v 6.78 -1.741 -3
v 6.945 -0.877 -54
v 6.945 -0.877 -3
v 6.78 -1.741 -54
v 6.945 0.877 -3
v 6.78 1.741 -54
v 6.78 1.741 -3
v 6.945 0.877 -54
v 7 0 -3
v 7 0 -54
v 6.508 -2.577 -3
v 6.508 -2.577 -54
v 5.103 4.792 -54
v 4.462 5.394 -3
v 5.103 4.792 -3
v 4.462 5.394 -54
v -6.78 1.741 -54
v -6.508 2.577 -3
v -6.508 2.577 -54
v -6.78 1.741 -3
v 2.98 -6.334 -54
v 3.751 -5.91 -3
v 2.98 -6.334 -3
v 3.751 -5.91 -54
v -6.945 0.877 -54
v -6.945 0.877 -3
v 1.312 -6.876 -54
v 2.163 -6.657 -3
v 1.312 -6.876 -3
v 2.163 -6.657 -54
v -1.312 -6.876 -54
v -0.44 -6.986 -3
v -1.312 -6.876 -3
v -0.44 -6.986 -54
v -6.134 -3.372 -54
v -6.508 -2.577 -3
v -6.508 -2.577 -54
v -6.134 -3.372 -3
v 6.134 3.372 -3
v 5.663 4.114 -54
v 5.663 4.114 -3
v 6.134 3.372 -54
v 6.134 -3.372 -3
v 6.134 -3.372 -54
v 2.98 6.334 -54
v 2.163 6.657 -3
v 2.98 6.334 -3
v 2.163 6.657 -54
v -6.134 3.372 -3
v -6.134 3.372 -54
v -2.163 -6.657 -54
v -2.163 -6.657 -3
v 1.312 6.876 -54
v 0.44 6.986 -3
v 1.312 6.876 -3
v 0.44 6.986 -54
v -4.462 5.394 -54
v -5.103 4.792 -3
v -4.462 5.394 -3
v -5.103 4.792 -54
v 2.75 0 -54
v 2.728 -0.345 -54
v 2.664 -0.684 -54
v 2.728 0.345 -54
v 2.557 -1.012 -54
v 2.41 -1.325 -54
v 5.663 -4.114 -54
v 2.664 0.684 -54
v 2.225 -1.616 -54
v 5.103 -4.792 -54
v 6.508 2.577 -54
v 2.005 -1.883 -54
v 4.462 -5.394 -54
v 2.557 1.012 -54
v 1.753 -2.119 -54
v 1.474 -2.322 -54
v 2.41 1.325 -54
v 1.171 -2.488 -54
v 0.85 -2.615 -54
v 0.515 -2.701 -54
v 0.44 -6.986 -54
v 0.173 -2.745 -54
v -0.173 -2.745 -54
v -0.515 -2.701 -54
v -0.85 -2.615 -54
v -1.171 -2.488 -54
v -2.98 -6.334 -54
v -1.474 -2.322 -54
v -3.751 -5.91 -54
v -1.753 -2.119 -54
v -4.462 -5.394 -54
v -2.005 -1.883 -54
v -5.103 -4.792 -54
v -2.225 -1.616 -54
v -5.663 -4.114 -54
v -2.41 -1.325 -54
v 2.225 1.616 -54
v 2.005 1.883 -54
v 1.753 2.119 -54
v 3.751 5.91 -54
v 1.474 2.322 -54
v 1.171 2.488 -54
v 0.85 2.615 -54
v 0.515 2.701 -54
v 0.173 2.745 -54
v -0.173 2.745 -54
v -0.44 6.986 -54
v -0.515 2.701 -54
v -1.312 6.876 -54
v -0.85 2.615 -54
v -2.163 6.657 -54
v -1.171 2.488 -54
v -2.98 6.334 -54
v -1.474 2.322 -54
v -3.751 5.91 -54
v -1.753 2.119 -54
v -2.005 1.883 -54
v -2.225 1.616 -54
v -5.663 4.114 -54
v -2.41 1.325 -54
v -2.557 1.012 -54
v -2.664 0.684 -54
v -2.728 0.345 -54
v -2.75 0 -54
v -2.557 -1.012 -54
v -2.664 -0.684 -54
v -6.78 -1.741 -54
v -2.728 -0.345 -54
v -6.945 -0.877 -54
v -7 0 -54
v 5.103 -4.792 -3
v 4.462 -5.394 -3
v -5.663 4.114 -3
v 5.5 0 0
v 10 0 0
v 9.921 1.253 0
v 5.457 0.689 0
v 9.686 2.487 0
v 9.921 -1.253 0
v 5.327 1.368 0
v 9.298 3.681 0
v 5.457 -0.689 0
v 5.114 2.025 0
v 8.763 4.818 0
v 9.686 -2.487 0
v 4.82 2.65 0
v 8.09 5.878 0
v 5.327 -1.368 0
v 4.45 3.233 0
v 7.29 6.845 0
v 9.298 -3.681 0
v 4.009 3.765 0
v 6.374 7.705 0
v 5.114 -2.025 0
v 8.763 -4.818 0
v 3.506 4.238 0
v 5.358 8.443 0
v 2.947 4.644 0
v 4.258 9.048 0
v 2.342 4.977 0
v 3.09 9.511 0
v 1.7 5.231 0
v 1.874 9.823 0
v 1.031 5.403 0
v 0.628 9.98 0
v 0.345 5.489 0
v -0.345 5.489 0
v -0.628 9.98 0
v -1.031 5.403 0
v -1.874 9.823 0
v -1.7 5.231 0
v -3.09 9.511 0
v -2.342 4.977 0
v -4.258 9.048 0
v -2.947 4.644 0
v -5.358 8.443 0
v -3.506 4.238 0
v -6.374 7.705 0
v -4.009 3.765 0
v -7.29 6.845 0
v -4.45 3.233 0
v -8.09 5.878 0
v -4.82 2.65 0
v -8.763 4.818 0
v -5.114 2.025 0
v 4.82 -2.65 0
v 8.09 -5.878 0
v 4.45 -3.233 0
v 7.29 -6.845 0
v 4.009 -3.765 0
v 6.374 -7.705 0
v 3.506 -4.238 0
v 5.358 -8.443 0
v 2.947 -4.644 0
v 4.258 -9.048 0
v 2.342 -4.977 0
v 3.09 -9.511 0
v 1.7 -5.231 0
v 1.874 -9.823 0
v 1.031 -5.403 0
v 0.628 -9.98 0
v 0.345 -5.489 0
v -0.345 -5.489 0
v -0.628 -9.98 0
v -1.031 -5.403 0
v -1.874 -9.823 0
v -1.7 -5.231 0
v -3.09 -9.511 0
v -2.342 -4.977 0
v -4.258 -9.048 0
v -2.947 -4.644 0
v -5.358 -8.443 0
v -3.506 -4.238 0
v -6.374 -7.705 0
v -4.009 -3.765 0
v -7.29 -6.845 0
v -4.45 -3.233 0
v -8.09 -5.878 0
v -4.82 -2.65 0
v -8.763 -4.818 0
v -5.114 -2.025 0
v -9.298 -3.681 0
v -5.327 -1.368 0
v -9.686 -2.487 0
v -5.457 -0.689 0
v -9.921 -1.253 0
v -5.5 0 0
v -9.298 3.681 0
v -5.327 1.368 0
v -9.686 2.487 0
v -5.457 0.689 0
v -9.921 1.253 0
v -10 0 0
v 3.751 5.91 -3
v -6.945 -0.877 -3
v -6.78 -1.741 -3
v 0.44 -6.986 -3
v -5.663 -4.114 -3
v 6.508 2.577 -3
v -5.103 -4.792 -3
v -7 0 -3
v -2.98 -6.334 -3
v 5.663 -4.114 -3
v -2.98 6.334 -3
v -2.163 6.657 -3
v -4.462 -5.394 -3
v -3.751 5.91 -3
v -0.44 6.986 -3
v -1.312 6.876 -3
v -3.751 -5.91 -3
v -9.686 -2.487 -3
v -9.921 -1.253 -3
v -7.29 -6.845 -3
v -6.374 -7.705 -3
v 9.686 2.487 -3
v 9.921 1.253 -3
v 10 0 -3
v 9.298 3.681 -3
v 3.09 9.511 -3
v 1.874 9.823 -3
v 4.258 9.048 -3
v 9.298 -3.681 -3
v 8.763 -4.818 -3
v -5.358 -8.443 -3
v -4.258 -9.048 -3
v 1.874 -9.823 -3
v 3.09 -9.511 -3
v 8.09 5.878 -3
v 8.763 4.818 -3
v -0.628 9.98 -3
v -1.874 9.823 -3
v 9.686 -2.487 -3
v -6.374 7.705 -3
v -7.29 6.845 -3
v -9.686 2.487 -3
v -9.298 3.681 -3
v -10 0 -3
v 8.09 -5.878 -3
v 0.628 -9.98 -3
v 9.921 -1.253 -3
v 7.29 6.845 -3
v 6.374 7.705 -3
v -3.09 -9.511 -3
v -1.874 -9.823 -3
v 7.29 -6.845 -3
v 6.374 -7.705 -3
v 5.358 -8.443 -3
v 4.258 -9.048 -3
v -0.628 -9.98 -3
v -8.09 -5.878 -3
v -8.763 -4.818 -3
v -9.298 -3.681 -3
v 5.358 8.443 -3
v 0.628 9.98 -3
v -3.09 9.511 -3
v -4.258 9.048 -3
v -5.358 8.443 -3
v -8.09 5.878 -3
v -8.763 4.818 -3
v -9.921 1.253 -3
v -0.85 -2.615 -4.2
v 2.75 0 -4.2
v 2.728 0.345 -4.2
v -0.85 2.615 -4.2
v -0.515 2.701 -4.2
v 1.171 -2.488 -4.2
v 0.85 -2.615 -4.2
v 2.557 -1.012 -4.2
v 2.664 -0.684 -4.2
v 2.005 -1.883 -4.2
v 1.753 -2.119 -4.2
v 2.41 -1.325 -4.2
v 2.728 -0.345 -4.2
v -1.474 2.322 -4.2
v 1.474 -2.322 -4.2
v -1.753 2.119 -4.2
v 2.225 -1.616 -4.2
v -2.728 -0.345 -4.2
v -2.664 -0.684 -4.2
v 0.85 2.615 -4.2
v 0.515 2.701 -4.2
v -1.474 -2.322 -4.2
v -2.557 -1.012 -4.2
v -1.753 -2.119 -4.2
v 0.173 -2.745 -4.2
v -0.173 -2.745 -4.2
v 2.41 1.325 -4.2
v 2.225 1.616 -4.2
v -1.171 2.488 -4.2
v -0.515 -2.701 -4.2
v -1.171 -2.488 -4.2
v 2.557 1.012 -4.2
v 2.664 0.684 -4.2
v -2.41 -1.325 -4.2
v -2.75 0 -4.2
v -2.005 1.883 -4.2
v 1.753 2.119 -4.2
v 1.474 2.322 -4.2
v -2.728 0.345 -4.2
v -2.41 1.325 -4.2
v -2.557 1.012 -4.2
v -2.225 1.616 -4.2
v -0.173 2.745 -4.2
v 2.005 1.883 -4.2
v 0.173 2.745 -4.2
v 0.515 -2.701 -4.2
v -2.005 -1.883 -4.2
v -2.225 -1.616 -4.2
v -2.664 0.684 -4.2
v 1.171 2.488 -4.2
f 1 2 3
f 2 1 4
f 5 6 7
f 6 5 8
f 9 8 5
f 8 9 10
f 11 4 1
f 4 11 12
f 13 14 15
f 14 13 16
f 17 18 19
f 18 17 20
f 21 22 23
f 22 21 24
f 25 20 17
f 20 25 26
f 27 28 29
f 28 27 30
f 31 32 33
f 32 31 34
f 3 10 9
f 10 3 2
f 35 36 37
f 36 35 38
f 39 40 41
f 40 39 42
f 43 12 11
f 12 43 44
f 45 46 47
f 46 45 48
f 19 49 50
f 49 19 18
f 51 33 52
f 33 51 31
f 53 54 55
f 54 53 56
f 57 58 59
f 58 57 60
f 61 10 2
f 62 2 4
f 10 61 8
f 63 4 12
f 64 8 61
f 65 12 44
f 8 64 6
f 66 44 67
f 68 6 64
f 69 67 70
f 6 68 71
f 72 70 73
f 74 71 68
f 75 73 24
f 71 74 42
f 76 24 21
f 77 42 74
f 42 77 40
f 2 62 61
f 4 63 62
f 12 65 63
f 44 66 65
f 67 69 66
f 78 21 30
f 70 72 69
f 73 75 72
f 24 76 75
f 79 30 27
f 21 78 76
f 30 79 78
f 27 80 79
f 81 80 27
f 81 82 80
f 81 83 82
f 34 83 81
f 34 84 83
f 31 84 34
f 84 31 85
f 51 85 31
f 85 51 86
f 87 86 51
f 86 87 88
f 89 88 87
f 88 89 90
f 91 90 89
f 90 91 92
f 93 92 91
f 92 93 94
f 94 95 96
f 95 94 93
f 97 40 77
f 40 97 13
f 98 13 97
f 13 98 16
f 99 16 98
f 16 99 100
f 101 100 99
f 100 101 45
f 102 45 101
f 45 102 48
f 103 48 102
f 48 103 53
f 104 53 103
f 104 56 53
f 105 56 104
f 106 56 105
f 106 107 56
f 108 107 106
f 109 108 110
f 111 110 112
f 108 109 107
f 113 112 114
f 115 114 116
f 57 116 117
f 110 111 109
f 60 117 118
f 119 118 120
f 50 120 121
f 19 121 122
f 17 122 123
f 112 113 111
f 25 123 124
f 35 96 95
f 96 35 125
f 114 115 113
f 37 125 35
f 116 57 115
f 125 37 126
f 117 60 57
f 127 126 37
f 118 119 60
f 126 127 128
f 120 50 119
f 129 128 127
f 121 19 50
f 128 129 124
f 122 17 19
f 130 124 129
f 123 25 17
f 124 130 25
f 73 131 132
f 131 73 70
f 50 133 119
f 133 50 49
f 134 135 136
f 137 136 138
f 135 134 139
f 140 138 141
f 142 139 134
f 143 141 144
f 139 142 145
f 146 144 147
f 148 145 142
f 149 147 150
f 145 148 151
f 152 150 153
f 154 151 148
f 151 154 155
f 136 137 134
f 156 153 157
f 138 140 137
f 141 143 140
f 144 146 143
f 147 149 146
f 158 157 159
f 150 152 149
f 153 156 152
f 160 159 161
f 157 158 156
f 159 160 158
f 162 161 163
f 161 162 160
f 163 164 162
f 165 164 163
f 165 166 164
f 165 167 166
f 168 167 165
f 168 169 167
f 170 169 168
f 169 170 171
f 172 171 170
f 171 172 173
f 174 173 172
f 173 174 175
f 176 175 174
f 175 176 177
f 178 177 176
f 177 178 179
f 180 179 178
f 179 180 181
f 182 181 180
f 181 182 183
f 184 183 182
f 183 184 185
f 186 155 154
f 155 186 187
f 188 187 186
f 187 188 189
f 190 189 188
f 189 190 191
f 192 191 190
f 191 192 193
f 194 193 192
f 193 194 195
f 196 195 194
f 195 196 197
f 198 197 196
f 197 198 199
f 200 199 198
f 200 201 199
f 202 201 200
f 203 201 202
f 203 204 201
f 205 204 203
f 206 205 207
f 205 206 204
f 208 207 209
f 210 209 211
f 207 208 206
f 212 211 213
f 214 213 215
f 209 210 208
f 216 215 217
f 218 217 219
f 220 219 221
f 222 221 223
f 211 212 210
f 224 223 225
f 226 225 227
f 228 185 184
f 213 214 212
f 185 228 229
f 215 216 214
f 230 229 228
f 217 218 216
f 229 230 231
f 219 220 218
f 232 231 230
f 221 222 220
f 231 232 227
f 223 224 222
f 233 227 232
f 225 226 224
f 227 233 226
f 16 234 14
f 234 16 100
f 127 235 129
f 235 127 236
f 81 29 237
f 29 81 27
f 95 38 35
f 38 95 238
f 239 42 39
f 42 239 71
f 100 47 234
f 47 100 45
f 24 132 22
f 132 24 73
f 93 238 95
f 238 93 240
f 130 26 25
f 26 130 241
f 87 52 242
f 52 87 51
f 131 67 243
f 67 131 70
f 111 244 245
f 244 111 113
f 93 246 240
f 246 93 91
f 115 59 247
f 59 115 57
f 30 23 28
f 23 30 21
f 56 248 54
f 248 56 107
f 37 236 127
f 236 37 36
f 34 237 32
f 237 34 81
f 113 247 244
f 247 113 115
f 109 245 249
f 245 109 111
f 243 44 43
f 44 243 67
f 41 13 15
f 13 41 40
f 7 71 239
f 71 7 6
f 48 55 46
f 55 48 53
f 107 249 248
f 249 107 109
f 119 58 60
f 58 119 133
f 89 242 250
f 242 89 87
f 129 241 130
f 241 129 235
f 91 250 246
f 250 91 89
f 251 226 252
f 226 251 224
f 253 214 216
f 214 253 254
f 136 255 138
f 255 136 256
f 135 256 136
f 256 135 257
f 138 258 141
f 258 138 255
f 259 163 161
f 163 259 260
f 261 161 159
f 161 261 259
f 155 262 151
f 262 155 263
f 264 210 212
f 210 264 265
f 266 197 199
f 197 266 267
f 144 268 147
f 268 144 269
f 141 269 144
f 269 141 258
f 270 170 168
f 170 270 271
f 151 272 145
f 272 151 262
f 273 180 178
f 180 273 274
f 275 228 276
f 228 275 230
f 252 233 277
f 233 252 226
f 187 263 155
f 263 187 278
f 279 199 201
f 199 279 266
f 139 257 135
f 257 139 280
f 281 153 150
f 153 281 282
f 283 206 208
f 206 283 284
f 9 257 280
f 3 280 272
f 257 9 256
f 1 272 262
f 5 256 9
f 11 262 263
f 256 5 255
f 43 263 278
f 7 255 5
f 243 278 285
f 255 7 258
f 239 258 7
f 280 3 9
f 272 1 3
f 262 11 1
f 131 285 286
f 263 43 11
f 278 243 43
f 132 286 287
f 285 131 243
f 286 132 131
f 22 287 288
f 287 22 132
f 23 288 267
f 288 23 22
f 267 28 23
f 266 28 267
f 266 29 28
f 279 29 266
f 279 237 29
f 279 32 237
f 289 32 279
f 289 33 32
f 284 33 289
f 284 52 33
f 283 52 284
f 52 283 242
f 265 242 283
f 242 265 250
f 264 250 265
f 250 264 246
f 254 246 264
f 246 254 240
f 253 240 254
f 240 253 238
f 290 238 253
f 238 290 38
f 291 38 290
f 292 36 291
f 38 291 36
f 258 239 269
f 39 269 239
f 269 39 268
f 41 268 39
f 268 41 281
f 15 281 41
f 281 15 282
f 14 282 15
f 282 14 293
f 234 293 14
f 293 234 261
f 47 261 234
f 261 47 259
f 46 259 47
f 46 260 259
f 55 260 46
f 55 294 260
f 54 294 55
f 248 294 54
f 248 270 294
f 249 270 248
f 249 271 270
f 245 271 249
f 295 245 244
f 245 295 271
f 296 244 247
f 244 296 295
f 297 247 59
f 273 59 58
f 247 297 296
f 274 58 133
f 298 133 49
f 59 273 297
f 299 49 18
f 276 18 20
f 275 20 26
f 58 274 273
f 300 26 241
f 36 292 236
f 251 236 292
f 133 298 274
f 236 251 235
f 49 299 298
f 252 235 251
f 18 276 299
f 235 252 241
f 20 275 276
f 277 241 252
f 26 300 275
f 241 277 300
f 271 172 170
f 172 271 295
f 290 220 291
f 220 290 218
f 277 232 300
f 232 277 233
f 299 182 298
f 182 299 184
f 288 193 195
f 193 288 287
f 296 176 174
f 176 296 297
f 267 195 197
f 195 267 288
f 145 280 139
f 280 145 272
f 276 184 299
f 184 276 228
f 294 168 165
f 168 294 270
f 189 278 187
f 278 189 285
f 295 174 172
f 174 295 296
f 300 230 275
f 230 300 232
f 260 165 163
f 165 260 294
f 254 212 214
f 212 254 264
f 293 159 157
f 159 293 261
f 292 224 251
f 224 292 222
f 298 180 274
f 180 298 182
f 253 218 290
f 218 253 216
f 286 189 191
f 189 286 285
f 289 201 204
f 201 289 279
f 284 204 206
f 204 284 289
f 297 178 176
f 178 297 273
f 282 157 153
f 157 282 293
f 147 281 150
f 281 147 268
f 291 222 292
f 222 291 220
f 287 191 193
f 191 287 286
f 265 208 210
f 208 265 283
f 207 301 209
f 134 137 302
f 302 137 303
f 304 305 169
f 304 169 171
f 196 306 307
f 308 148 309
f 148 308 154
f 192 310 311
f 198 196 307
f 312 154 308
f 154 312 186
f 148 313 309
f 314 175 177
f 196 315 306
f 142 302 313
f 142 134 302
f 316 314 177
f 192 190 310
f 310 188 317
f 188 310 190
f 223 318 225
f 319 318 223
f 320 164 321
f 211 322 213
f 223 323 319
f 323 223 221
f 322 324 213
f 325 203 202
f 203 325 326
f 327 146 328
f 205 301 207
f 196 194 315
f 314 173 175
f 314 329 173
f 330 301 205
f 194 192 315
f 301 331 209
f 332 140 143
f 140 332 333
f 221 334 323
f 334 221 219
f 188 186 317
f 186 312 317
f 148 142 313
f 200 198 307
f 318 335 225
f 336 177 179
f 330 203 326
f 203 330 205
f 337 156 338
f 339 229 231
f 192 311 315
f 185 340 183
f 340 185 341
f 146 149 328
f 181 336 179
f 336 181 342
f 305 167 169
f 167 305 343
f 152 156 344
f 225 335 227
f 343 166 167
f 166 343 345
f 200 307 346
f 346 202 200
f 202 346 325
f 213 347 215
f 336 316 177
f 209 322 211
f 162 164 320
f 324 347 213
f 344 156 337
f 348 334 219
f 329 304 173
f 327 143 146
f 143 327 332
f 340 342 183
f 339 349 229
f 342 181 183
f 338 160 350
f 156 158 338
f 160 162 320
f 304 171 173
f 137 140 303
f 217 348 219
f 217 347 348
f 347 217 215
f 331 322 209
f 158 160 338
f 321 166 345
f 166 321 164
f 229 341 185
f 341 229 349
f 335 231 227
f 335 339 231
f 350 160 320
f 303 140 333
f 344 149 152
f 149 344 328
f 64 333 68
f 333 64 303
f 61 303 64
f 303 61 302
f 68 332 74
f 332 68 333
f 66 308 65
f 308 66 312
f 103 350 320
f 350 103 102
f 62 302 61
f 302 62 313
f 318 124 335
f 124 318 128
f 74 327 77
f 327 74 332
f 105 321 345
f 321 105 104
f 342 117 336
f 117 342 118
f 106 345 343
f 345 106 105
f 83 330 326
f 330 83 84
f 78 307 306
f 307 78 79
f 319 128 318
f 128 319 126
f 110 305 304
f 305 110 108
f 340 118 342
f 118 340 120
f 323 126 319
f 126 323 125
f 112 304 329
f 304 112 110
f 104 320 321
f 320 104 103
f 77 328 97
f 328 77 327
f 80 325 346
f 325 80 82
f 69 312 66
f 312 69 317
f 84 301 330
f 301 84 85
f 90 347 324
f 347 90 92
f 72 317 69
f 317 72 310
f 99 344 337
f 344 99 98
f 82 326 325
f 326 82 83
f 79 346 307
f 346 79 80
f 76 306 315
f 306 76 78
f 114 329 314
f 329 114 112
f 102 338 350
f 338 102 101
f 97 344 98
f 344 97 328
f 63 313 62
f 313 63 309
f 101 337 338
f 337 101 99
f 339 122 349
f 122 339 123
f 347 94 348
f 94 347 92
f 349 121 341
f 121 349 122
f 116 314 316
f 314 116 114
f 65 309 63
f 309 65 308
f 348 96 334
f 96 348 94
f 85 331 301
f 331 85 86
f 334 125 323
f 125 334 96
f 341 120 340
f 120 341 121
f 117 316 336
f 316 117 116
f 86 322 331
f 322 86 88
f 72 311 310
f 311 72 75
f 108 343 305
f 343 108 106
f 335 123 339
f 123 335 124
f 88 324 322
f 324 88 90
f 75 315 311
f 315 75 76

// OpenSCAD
$fn = 50;


difference() {
	union() {
		translate(v = [0, 0, -54.0000000000]) {
			cylinder(h = 54, r = 7.0000000000);
		}
		translate(v = [0, 0, -3.0000000000]) {
			cylinder(h = 3, r = 10.0000000000);
		}
	}
	union() {
		translate(v = [0, 0, 0]) {
			rotate(a = [0, 0, 0]) {
				difference() {
					union() {
						#translate(v = [0, 0, -54.0000000000]) {
							cylinder(h = 54, r = 2.2500000000);
						}
						#translate(v = [0, 0, -4.2000000000]) {
							cylinder(h = 4.2000000000, r1 = 2.7500000000, r2 = 5.5000000000);
						}
						#translate(v = [0, 0, -54.0000000000]) {
							cylinder(h = 54, r = 2.7500000000);
						}
						#translate(v = [0, 0, -54.0000000000]) {
							cylinder(h = 54, r = 2.2500000000);
						}
					}
					union();
				}
			}
		}
	}
}
